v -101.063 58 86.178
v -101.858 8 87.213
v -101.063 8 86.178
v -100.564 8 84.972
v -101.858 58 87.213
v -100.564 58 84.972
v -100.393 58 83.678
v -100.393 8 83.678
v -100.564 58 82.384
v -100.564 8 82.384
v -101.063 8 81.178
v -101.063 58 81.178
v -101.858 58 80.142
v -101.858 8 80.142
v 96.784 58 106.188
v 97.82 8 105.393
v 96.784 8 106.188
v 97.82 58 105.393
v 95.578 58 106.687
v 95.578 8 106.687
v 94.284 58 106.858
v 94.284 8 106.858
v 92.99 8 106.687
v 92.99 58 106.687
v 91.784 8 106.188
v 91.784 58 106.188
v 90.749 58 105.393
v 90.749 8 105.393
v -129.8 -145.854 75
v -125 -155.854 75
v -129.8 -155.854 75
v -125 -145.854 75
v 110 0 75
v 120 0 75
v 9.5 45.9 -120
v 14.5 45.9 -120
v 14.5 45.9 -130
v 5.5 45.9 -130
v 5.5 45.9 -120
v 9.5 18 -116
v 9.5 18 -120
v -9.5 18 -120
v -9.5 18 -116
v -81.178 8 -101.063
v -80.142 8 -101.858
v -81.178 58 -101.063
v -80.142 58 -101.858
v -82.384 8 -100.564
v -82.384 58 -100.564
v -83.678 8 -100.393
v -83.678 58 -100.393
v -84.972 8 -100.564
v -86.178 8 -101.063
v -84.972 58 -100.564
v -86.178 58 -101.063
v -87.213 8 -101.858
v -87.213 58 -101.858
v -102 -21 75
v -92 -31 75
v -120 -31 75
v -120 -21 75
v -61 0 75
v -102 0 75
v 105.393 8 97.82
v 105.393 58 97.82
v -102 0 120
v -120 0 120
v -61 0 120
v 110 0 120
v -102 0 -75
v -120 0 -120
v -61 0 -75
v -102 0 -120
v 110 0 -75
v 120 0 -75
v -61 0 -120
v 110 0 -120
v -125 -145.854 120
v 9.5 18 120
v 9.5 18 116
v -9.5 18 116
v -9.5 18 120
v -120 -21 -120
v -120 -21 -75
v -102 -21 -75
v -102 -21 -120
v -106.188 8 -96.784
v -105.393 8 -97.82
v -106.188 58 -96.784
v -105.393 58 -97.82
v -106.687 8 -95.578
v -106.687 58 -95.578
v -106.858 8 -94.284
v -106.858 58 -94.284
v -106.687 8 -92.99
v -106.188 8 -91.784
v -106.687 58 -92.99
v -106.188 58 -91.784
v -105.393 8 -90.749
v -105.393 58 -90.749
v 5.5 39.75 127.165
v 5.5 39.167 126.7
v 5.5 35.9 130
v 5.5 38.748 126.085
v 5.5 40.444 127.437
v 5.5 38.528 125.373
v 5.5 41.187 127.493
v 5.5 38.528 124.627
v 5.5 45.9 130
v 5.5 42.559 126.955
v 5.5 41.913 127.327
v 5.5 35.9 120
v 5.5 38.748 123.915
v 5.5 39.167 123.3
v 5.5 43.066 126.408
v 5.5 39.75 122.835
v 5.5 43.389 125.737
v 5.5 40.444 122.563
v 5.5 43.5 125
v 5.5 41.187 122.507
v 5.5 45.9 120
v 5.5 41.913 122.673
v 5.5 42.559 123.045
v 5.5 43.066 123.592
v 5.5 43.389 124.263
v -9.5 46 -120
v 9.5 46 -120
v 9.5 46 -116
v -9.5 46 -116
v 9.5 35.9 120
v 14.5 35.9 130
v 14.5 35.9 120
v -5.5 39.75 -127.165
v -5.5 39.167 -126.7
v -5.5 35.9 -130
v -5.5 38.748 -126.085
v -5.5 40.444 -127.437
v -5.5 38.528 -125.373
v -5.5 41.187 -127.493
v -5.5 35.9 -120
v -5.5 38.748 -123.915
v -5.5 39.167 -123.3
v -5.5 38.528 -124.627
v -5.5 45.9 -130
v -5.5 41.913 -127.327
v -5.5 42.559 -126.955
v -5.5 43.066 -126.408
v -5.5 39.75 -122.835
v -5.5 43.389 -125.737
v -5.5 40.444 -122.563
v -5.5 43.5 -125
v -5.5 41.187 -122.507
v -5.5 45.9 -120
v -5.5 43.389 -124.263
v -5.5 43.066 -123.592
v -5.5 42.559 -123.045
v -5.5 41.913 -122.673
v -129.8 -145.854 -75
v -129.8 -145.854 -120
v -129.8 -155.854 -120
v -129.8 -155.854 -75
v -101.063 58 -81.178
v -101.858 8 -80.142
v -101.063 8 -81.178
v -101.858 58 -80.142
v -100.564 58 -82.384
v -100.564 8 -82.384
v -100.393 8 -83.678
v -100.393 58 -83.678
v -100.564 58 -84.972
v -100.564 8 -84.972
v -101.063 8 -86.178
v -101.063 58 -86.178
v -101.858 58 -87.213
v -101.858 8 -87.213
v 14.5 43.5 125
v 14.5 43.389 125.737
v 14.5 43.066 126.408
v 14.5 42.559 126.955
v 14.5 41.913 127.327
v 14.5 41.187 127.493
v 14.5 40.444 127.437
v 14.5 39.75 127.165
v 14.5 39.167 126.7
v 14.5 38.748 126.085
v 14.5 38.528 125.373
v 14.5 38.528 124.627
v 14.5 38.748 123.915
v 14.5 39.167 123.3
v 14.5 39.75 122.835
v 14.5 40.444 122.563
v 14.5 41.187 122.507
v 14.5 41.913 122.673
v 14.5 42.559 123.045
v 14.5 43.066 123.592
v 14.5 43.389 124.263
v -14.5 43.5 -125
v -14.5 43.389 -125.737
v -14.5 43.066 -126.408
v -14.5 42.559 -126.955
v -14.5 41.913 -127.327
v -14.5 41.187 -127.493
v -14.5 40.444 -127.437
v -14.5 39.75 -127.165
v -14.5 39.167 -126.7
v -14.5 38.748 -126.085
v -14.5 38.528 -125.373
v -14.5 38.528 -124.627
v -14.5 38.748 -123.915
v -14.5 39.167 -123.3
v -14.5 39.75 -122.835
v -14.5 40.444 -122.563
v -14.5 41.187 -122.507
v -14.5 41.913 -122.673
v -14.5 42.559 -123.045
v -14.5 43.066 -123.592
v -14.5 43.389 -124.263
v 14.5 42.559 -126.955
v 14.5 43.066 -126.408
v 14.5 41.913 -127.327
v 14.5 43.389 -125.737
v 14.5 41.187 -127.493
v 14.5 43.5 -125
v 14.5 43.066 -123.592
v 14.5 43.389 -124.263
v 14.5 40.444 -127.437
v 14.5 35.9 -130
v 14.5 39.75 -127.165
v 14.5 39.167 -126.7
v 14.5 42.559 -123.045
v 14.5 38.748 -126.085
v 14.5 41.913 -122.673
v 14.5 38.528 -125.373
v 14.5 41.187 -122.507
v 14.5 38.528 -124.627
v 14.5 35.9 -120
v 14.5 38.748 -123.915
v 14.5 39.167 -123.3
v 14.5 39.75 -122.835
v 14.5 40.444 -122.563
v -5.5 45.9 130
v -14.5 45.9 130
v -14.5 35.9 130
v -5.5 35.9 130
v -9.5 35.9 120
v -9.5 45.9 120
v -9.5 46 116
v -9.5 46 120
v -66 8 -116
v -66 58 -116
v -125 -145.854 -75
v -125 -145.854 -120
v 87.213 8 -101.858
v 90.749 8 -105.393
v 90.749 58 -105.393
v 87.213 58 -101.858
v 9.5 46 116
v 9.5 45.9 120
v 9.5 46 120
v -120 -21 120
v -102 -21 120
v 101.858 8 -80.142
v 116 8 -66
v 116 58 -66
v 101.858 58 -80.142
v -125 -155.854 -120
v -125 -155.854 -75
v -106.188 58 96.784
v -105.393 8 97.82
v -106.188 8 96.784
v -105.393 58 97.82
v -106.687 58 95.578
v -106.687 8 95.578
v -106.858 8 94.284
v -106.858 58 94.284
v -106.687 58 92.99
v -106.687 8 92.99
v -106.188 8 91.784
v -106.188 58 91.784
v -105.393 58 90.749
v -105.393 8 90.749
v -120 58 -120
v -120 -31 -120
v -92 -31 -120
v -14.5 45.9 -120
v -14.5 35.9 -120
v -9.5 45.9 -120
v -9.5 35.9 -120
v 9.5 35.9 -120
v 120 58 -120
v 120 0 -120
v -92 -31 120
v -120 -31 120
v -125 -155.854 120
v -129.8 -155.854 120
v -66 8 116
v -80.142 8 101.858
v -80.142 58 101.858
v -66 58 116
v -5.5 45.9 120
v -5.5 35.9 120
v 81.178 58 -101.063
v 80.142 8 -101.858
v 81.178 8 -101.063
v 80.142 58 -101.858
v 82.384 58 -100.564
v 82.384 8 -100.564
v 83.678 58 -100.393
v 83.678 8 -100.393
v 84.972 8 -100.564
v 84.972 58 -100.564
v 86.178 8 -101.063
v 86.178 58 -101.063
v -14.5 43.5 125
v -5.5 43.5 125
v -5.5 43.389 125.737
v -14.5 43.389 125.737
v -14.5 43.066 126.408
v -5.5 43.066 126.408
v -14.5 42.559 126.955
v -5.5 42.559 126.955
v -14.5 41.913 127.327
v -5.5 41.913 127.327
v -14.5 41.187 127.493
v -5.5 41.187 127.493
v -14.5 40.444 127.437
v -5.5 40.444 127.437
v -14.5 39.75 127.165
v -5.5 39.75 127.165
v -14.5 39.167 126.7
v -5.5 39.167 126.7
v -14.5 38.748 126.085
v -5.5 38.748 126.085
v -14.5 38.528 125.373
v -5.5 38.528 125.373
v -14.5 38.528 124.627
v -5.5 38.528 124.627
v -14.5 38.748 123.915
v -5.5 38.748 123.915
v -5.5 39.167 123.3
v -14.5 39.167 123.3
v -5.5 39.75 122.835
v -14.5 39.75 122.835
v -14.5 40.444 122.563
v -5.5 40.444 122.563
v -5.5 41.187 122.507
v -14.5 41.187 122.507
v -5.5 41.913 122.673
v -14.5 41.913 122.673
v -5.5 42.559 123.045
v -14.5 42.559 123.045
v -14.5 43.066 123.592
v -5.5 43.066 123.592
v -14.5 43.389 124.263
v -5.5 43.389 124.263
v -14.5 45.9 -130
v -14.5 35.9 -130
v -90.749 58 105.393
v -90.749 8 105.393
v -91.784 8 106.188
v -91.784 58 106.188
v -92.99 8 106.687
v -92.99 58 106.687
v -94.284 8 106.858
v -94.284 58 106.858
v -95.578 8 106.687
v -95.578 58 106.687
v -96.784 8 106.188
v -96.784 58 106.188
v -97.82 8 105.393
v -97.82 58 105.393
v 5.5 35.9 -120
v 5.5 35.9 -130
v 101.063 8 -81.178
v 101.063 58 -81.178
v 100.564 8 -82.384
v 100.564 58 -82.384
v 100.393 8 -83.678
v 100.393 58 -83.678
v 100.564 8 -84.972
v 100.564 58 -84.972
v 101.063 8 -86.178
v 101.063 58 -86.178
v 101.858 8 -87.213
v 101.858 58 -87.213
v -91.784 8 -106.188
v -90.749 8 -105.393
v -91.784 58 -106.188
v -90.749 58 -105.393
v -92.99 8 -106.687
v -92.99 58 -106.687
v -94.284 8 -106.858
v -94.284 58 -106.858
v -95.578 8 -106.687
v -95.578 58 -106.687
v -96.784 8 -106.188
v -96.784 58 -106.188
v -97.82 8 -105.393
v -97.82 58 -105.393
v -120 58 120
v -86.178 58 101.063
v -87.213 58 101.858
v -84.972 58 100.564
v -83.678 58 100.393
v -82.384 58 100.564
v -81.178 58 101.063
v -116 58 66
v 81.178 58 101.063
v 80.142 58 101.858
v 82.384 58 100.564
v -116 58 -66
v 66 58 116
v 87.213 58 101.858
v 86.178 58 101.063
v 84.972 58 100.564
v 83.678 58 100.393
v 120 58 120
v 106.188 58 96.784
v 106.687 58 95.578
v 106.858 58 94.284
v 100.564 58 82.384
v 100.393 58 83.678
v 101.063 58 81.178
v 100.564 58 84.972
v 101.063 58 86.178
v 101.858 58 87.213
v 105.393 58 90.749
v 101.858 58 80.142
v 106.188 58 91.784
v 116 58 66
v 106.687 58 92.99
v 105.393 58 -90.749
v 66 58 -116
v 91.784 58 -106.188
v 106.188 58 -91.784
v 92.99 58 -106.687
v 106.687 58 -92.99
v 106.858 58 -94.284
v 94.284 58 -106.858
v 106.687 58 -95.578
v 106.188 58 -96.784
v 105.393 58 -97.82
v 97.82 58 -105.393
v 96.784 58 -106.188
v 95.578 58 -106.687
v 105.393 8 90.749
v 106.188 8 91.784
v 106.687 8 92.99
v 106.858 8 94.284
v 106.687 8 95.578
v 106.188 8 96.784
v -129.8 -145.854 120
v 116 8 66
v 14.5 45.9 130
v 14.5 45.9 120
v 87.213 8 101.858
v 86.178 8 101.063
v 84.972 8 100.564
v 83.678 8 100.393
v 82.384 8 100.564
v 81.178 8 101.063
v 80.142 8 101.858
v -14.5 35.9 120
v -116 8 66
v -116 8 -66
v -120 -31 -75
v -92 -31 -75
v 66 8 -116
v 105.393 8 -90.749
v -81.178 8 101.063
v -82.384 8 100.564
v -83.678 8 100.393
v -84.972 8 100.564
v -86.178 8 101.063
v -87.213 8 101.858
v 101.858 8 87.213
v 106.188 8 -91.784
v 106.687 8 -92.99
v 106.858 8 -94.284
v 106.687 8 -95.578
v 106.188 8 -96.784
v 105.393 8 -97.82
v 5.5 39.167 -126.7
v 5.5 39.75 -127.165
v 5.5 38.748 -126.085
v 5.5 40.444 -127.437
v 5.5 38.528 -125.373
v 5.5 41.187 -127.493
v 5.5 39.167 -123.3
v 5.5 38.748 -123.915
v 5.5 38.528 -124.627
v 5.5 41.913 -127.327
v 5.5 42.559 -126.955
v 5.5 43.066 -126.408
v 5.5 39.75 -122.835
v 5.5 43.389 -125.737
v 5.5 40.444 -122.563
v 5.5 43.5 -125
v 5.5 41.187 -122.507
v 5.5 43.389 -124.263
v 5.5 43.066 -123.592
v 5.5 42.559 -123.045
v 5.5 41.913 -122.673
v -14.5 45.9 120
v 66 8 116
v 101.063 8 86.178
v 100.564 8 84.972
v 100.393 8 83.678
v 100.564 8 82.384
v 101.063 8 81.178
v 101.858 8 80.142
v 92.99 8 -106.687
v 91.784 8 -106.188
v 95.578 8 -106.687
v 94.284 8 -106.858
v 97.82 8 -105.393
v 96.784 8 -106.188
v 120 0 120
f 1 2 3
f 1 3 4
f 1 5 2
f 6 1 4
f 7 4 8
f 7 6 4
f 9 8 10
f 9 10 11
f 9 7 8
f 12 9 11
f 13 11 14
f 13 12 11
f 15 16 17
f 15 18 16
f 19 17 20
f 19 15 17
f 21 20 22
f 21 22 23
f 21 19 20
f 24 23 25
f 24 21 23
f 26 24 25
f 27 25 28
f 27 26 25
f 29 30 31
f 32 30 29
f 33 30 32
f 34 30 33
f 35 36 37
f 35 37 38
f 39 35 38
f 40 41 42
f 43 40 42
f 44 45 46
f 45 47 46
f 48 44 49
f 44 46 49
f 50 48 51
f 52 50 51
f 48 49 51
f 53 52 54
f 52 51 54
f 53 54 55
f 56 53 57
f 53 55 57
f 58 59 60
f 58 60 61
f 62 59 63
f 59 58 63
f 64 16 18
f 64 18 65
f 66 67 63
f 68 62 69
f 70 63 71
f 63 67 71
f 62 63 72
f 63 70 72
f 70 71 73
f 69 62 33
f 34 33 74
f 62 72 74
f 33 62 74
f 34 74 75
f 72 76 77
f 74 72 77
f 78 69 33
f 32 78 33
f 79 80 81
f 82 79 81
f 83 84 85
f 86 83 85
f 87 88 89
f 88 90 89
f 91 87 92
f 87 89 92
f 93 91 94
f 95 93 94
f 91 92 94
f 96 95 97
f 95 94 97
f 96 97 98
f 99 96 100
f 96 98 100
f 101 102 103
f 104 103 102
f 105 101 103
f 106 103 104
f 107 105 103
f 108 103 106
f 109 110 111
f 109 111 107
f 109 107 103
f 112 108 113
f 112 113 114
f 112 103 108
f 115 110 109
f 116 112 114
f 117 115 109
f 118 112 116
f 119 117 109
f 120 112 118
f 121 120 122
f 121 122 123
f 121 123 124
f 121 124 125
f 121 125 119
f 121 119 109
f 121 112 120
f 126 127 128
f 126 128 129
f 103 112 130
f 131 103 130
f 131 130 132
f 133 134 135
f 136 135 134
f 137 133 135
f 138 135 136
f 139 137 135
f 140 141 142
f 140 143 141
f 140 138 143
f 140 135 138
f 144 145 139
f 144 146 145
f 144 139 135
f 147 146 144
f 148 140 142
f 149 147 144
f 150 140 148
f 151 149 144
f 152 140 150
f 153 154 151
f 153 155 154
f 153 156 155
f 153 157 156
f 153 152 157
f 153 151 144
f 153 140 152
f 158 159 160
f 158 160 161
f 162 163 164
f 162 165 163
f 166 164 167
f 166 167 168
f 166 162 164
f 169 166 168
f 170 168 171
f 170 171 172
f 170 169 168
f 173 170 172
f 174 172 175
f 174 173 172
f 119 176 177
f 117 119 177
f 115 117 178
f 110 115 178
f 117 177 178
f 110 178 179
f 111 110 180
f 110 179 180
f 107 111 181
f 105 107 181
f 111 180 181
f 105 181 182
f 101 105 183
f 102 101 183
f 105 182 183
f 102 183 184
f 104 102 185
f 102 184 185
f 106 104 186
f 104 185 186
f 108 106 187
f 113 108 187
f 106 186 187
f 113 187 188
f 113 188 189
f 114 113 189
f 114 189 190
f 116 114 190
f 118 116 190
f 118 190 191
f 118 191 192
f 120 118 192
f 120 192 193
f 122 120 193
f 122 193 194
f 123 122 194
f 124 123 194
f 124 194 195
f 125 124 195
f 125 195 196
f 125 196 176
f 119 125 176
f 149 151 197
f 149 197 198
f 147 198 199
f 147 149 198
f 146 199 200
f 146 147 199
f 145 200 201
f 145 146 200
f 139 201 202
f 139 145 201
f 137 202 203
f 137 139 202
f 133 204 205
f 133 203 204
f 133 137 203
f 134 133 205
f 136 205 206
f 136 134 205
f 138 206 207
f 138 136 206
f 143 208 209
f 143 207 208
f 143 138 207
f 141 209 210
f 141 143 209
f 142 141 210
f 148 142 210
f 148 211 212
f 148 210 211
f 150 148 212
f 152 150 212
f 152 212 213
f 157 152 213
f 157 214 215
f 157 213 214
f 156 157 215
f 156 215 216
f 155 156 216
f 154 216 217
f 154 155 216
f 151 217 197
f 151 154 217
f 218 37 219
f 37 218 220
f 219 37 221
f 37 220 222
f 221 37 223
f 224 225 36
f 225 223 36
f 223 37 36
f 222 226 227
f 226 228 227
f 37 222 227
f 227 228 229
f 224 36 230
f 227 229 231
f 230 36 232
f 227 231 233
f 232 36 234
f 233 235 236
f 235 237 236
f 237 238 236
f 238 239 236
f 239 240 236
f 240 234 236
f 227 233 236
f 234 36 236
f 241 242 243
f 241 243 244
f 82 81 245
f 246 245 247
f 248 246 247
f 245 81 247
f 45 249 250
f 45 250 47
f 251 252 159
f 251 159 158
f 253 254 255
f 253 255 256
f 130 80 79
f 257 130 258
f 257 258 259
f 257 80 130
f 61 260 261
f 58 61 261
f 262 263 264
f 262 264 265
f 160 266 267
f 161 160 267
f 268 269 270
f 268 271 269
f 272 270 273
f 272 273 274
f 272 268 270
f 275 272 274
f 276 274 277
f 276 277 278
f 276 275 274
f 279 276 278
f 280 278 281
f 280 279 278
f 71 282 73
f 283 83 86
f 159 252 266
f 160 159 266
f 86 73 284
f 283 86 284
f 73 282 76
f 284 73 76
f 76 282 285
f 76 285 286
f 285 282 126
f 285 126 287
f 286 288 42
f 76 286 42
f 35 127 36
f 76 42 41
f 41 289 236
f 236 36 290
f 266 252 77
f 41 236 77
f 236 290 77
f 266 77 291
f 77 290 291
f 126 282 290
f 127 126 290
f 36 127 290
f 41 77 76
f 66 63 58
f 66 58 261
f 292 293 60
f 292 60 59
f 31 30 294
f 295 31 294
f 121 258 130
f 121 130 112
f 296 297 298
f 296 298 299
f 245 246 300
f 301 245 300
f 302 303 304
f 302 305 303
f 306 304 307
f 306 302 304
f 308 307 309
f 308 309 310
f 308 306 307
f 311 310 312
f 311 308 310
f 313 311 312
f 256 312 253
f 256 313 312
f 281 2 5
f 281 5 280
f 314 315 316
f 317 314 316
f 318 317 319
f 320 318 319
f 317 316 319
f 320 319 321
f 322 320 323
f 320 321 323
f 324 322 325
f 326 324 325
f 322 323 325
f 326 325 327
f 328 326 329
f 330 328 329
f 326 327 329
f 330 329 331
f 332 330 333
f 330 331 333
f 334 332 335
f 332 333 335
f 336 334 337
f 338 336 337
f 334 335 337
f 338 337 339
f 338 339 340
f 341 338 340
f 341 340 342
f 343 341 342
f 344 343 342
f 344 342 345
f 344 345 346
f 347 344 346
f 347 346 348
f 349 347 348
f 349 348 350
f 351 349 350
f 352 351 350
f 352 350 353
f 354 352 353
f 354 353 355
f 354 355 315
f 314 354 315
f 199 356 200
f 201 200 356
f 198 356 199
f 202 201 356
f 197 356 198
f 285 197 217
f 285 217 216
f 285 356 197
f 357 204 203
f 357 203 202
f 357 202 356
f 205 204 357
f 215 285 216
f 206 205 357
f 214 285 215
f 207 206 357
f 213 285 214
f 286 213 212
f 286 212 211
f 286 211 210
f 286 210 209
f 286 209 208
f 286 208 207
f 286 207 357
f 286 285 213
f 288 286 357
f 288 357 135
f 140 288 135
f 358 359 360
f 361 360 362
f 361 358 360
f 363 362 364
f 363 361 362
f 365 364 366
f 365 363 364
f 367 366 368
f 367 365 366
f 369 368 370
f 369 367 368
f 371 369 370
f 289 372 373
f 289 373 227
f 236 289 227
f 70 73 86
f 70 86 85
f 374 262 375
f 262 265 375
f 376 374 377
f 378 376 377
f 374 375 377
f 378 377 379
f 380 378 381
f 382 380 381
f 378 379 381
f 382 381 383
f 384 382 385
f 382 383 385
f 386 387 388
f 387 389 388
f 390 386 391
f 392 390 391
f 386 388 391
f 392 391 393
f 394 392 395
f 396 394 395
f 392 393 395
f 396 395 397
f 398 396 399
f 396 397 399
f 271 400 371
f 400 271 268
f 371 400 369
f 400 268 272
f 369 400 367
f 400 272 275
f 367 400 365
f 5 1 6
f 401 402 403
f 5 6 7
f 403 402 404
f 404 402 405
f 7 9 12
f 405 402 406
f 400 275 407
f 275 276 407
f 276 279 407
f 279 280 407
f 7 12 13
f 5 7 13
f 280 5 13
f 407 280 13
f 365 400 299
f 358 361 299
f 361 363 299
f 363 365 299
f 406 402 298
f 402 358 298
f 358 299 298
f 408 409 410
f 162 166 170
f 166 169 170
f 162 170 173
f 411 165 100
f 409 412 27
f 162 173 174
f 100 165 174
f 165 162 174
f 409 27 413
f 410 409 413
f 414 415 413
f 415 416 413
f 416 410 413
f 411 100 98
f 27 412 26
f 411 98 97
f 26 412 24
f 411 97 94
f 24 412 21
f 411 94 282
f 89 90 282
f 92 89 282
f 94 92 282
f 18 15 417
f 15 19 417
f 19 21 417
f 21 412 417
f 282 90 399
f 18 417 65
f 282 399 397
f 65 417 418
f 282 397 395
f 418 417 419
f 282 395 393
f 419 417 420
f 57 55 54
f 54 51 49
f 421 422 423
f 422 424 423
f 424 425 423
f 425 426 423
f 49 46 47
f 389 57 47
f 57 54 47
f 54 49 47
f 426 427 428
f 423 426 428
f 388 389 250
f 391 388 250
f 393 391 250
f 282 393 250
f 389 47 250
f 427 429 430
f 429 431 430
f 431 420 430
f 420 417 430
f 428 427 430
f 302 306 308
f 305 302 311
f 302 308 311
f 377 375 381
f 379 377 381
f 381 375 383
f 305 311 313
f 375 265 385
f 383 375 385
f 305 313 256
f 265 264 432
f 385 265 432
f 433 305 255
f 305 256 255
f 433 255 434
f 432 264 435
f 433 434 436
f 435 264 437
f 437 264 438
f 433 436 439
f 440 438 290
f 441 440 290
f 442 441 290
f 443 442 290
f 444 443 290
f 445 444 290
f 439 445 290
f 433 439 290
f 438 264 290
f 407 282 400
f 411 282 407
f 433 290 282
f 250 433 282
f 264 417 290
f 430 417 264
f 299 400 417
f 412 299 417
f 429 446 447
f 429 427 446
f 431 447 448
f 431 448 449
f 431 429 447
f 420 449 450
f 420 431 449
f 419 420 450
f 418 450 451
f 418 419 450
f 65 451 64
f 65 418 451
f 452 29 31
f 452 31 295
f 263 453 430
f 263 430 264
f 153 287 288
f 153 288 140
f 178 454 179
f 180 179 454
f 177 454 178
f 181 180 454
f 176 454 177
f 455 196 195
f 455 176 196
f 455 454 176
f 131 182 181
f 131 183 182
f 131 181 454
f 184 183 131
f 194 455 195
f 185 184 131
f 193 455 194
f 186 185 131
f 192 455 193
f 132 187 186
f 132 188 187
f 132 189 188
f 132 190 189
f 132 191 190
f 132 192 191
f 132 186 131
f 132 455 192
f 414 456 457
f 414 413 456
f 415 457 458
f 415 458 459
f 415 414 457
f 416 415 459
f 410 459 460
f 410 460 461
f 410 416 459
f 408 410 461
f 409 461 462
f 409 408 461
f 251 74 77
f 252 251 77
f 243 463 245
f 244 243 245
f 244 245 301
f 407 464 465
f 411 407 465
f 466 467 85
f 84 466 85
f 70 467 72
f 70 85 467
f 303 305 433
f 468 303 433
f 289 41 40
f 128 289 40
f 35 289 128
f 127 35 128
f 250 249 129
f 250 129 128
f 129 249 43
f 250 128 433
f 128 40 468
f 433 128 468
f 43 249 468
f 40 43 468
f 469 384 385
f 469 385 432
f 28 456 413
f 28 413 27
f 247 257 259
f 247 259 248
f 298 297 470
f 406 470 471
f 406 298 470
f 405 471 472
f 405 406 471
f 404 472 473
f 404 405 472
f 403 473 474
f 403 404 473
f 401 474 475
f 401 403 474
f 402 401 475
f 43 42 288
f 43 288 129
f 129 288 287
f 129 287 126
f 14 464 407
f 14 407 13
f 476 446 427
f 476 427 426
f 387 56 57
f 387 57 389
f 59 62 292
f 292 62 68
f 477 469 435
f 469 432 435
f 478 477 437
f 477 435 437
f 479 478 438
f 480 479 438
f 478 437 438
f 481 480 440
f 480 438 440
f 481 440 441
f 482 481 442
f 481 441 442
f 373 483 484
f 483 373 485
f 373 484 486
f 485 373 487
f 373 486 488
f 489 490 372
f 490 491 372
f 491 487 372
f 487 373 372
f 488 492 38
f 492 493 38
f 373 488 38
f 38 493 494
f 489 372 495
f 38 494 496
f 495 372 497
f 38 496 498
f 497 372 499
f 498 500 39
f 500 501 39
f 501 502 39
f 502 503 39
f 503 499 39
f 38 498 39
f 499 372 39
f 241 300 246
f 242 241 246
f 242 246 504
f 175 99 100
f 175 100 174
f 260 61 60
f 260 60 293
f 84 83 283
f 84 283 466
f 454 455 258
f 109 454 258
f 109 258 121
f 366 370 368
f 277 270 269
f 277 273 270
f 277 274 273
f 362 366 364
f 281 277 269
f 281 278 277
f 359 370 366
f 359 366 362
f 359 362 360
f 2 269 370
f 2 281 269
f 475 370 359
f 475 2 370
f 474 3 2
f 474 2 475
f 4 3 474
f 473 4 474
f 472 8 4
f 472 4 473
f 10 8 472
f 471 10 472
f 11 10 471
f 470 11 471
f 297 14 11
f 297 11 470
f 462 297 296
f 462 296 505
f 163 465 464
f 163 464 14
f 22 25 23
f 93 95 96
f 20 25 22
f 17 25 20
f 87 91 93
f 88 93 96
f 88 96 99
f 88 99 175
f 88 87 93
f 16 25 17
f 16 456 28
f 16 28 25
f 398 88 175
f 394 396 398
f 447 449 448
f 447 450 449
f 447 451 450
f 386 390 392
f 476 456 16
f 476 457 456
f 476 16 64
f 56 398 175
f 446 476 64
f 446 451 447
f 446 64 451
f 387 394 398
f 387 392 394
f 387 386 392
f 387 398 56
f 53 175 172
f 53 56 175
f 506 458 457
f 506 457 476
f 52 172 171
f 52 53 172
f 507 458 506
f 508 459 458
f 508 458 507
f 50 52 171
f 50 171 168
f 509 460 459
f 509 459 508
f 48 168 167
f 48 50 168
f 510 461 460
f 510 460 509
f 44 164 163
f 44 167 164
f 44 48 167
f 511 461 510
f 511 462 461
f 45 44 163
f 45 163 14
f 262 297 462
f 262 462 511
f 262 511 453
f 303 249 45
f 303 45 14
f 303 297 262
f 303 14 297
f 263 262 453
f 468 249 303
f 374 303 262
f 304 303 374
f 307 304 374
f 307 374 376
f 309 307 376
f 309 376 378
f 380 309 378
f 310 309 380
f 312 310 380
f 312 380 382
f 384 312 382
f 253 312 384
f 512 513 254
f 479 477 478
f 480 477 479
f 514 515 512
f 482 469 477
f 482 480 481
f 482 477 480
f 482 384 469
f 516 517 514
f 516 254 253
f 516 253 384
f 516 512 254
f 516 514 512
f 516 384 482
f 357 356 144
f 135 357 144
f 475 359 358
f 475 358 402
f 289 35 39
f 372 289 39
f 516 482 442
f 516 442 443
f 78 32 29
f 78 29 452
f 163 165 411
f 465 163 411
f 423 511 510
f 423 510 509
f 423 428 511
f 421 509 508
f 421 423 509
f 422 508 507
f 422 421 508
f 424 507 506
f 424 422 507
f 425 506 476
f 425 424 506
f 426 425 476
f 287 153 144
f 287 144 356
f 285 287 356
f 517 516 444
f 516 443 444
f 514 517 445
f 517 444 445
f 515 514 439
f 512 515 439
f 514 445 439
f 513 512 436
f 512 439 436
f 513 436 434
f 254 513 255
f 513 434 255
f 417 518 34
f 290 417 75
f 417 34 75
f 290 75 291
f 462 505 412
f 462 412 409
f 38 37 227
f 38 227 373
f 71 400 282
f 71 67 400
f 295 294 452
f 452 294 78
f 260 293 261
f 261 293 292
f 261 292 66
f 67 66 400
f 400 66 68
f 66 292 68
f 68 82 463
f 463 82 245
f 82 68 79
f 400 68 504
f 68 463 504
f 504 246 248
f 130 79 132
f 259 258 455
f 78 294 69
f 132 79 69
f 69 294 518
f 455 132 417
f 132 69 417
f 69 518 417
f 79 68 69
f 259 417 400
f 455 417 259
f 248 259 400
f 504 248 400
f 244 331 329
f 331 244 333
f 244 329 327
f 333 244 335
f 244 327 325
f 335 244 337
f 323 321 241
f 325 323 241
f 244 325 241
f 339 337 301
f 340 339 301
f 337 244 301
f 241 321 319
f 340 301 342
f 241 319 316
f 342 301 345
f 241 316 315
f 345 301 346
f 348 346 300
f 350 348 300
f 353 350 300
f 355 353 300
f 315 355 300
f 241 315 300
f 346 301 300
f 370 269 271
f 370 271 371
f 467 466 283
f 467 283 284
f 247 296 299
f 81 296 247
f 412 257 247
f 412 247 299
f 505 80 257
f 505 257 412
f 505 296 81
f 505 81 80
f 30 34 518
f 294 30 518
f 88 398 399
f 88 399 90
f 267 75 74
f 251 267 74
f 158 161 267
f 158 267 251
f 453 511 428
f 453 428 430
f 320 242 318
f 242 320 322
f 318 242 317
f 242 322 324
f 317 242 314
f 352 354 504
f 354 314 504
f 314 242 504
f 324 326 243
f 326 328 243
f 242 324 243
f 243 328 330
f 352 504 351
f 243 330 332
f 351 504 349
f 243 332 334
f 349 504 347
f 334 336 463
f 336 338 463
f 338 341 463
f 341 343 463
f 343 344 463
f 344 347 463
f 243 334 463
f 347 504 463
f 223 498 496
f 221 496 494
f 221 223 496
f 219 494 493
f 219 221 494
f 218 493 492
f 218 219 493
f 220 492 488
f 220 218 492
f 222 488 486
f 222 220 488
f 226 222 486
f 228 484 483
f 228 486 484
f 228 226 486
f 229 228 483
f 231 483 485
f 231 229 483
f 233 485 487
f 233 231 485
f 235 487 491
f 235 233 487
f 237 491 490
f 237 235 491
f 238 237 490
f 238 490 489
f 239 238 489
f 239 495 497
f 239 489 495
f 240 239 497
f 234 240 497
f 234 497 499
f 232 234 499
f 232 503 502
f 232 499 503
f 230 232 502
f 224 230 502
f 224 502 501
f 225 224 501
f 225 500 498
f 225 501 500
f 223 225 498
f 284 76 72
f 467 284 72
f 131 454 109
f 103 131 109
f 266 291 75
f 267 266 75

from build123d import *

# Parameters (mm, degrees)
SZKIC1_W                        = 240
SZKIC1_H                        = 240
DODANIE_WYCI_GNI_CIE1_DEPTH     = 8
SZKIC2_W                        = 240
SZKIC2_H                        = 240
SZKIC2_W_2                      = 232
SZKIC2_H_2                      = 232
DODANIE_WYCI_GNI_CIE2_DEPTH     = 50
DODANIE_WYCI_GNI_CIE6_DEPTH     = 50
ZAOKR_GLENIE1_R                 = 5
SZYK_KO_OWY1_COUNT              = 4
ZAOKR_GLENIE1_OF_SZYK_KO_OWY1_R = 5
SZKIC12_W                       = 19
SZKIC12_H                       = 28
WYTNIJ_WYCI_GNI_CIE3_DEPTH      = 275.525044395
DODANIE_WYCI_GNI_CIE7_DEPTH     = 10
SZKIC16_R                       = 2.5
WYTNIJ_WYCI_GNI_CIE4_DEPTH      = 196.842411137
SZKIC5_W                        = 10
SZKIC5_H                        = 240
DODANIE_WYCI_GNI_CIE3_DEPTH     = 21
SZKIC6_W                        = 28
SZKIC6_H                        = 240
DODANIE_WYCI_GNI_CIE4_DEPTH     = 10
SFAZOWANIE2_SIZE                = 31
WYTNIJ_WYCI_GNI_CIE2_DEPTH      = 319.144010562
WYTNIJ_WYCI_GNI_CIE2_DEPTH_BACK = 319.144010562
SZKIC9_W                        = 150
SZKIC9_H                        = 155.854455748
SZKIC10_W                       = 45
SZKIC10_H                       = 10
DODANIE_WYCI_GNI_CIE5_DEPTH     = 4.8


with BuildPart() as part:
    # Szkic1 → Dodanie-wyciągnięcie1 (new body)
    with BuildSketch(Plane(origin=(0, 0, 0), x_dir=(1, 0, 0), z_dir=(0, 1, 0))):
        Rectangle(SZKIC1_W, SZKIC1_H)
    extrude(amount=DODANIE_WYCI_GNI_CIE1_DEPTH)

    # Szkic2 → Dodanie-wyciągnięcie2 (add)
    with BuildSketch(Plane(origin=(0, 8, 0), x_dir=(1, 0, 0), z_dir=(0, 1, 0))):
        Rectangle(SZKIC2_W, SZKIC2_H)
        Rectangle(SZKIC2_W_2, SZKIC2_H_2, mode=Mode.SUBTRACT)
    extrude(amount=DODANIE_WYCI_GNI_CIE2_DEPTH)

    # Szkic11 → Dodanie-wyciągnięcie6 (add)
    with BuildSketch(Plane(origin=(0, 8, 0), x_dir=(1, 0, 0), z_dir=(0, 1, 0))):
        Polygon((-116, 116), (-66, 116), (-83.67766953, 98.32233047), (-94.284271247, 108.928932188), (-108.928932188, 94.284271247), (-98.32233047, 83.67766953), (-116, 66), align=None)
    dodanie_wyci_gni_cie6 = extrude(amount=DODANIE_WYCI_GNI_CIE6_DEPTH)

    # Zaokrąglenie1
    zaokr_glenie1_edges = [part.edges().sort_by_distance(p)[0] for p in [
        (-98.32233047, 33, -83.67766953),
        (-108.928932188, 33, -94.284271247),
        (-94.284271247, 33, -108.928932188),
        (-83.67766953, 33, -98.32233047),
    ]]
    fillet(zaokr_glenie1_edges, radius=ZAOKR_GLENIE1_R)

    # Szyk kołowy1: Dodanie-wyciągnięcie6 ×4 about axis
    szyk_ko_owy1_axis = Axis((0, 0, 0), (0, 1, 0))
    for i in range(1, SZYK_KO_OWY1_COUNT):
        add(dodanie_wyci_gni_cie6.rotate(szyk_ko_owy1_axis, i * 360 / SZYK_KO_OWY1_COUNT))

    # Zaokrąglenie1 of Szyk kołowy1
    zaokr_glenie1_of_szyk_ko_owy1_edges = [part.edges().sort_by_distance(p)[0] for p in [
        (-83.67766953, 33, 98.32233047),
        (-94.284271247, 33, 108.928932188),
        (-108.928932188, 33, 94.284271247),
        (-98.32233047, 33, 83.67766953),
        (98.32233047, 33, 83.67766953),
        (108.928932188, 33, 94.284271247),
        (94.284271247, 33, 108.928932188),
        (83.67766953, 33, 98.32233047),
        (83.67766953, 33, -98.32233047),
        (94.284271247, 33, -108.928932188),
        (108.928932188, 33, -94.284271247),
        (98.32233047, 33, -83.67766953),
    ]]
    fillet(zaokr_glenie1_of_szyk_ko_owy1_edges, radius=ZAOKR_GLENIE1_OF_SZYK_KO_OWY1_R)

    # Szkic12 → Wytnij-wyciągnięcie3 (cut, through all)
    with BuildSketch(Plane(origin=(0, 0, -120), x_dir=(-1, 0, 0), z_dir=(0, 0, -1))):
        with Locations((0, 32)):
            Rectangle(SZKIC12_W, SZKIC12_H)
    extrude(amount=-WYTNIJ_WYCI_GNI_CIE3_DEPTH, mode=Mode.SUBTRACT)

    # Szkic15 → Dodanie-wyciągnięcie7 (add)
    with BuildSketch(Plane.XY.offset(120)):
        Polygon((9.5, 45.9), (14.5, 45.9), (14.5, 35.9), (9.5, 35.9), (5.5, 35.9), (5.5, 45.9), align=None)
        Polygon((-14.5, 45.9), (-14.5, 35.9), (-9.5, 35.9), (-5.5, 35.9), (-5.5, 45.9), (-9.5, 45.9), align=None)
    dodanie_wyci_gni_cie7 = extrude(amount=DODANIE_WYCI_GNI_CIE7_DEPTH)

    # Szkic16 → Wytnij-wyciągnięcie4 (cut, through all)
    with BuildSketch(Plane(origin=(14.5, 0, 0), x_dir=(0, 0, -1), z_dir=(1, 0, 0))):
        with Locations(Location((-125, 41, 0), (0, 0, 90))):
            Circle(SZKIC16_R)
    wytnij_wyci_gni_cie4 = extrude(amount=-WYTNIJ_WYCI_GNI_CIE4_DEPTH, mode=Mode.SUBTRACT)

    # Lustro1: Dodanie-wyciągnięcie7, Wytnij-wyciągnięcie4 across plane
    add(dodanie_wyci_gni_cie7.mirror(Plane.XY))
    add(wytnij_wyci_gni_cie4.mirror(Plane.XY), mode=Mode.SUBTRACT)

    # Szkic5 → Dodanie-wyciągnięcie3 (add)
    with BuildSketch(Plane.XZ):
        with Locations((-97, 0)):
            Rectangle(SZKIC5_W, SZKIC5_H)
    extrude(amount=DODANIE_WYCI_GNI_CIE3_DEPTH)

    # Szkic6 → Dodanie-wyciągnięcie4 (add)
    with BuildSketch(Plane.XZ.offset(21)):
        with Locations((-106, 0)):
            Rectangle(SZKIC6_W, SZKIC6_H)
    extrude(amount=DODANIE_WYCI_GNI_CIE4_DEPTH)

    # Sfazowanie2
    sfazowanie2_edges = [part.edges().sort_by_distance(p)[0] for p in [
        (-92, 0, 0),
    ]]
    chamfer(sfazowanie2_edges, length=SFAZOWANIE2_SIZE - 0.0001)  # a hair under: the kernel refuses the full size

    # Szkic8 → Wyciągnięcie po profilach1 section 0
    with BuildSketch(Plane.ZY.offset(125)):
        with BuildLine():
            Line((-120, -155.854455748), (120, -155.854455748))
            Line((120, -155.854455748), (120, -145.854455748))
            Line((120, -145.854455748), (-120, -145.854455748))
            Line((-120, -145.854455748), (-120, -155.854455748))
        make_face()
    # Szkic7 → Wyciągnięcie po profilach1 section 1
    with BuildSketch(Plane.XZ):
        with BuildLine():
            Line((120, 120), (110, 120))
            Line((110, 120), (110, -120))
            Line((110, -120), (120, -120))
            Line((120, -120), (120, 120))
        make_face()
    loft()

    # Szkic9 → Wytnij-wyciągnięcie2 (cut, two sides: drawn at the far end of the back side and taken through both)
    with BuildSketch(Plane(origin=(120, 0, 0), x_dir=(0, 0, -1), z_dir=(1, 0, 0)).offset(-WYTNIJ_WYCI_GNI_CIE2_DEPTH_BACK)):
        with Locations((0, -77.927227874)):
            Rectangle(SZKIC9_W, SZKIC9_H)
    extrude(amount=WYTNIJ_WYCI_GNI_CIE2_DEPTH + WYTNIJ_WYCI_GNI_CIE2_DEPTH_BACK, mode=Mode.SUBTRACT)

    # Szkic10 → Dodanie-wyciągnięcie5 (add)
    with BuildSketch(Plane.ZY.offset(125)):
        with Locations((97.5, -150.854455748)):
            Rectangle(SZKIC10_W, SZKIC10_H)
        with Locations((-97.5, -150.854455748)):
            Rectangle(SZKIC10_W, SZKIC10_H)
    extrude(amount=DODANIE_WYCI_GNI_CIE5_DEPTH)


solid = part.part
